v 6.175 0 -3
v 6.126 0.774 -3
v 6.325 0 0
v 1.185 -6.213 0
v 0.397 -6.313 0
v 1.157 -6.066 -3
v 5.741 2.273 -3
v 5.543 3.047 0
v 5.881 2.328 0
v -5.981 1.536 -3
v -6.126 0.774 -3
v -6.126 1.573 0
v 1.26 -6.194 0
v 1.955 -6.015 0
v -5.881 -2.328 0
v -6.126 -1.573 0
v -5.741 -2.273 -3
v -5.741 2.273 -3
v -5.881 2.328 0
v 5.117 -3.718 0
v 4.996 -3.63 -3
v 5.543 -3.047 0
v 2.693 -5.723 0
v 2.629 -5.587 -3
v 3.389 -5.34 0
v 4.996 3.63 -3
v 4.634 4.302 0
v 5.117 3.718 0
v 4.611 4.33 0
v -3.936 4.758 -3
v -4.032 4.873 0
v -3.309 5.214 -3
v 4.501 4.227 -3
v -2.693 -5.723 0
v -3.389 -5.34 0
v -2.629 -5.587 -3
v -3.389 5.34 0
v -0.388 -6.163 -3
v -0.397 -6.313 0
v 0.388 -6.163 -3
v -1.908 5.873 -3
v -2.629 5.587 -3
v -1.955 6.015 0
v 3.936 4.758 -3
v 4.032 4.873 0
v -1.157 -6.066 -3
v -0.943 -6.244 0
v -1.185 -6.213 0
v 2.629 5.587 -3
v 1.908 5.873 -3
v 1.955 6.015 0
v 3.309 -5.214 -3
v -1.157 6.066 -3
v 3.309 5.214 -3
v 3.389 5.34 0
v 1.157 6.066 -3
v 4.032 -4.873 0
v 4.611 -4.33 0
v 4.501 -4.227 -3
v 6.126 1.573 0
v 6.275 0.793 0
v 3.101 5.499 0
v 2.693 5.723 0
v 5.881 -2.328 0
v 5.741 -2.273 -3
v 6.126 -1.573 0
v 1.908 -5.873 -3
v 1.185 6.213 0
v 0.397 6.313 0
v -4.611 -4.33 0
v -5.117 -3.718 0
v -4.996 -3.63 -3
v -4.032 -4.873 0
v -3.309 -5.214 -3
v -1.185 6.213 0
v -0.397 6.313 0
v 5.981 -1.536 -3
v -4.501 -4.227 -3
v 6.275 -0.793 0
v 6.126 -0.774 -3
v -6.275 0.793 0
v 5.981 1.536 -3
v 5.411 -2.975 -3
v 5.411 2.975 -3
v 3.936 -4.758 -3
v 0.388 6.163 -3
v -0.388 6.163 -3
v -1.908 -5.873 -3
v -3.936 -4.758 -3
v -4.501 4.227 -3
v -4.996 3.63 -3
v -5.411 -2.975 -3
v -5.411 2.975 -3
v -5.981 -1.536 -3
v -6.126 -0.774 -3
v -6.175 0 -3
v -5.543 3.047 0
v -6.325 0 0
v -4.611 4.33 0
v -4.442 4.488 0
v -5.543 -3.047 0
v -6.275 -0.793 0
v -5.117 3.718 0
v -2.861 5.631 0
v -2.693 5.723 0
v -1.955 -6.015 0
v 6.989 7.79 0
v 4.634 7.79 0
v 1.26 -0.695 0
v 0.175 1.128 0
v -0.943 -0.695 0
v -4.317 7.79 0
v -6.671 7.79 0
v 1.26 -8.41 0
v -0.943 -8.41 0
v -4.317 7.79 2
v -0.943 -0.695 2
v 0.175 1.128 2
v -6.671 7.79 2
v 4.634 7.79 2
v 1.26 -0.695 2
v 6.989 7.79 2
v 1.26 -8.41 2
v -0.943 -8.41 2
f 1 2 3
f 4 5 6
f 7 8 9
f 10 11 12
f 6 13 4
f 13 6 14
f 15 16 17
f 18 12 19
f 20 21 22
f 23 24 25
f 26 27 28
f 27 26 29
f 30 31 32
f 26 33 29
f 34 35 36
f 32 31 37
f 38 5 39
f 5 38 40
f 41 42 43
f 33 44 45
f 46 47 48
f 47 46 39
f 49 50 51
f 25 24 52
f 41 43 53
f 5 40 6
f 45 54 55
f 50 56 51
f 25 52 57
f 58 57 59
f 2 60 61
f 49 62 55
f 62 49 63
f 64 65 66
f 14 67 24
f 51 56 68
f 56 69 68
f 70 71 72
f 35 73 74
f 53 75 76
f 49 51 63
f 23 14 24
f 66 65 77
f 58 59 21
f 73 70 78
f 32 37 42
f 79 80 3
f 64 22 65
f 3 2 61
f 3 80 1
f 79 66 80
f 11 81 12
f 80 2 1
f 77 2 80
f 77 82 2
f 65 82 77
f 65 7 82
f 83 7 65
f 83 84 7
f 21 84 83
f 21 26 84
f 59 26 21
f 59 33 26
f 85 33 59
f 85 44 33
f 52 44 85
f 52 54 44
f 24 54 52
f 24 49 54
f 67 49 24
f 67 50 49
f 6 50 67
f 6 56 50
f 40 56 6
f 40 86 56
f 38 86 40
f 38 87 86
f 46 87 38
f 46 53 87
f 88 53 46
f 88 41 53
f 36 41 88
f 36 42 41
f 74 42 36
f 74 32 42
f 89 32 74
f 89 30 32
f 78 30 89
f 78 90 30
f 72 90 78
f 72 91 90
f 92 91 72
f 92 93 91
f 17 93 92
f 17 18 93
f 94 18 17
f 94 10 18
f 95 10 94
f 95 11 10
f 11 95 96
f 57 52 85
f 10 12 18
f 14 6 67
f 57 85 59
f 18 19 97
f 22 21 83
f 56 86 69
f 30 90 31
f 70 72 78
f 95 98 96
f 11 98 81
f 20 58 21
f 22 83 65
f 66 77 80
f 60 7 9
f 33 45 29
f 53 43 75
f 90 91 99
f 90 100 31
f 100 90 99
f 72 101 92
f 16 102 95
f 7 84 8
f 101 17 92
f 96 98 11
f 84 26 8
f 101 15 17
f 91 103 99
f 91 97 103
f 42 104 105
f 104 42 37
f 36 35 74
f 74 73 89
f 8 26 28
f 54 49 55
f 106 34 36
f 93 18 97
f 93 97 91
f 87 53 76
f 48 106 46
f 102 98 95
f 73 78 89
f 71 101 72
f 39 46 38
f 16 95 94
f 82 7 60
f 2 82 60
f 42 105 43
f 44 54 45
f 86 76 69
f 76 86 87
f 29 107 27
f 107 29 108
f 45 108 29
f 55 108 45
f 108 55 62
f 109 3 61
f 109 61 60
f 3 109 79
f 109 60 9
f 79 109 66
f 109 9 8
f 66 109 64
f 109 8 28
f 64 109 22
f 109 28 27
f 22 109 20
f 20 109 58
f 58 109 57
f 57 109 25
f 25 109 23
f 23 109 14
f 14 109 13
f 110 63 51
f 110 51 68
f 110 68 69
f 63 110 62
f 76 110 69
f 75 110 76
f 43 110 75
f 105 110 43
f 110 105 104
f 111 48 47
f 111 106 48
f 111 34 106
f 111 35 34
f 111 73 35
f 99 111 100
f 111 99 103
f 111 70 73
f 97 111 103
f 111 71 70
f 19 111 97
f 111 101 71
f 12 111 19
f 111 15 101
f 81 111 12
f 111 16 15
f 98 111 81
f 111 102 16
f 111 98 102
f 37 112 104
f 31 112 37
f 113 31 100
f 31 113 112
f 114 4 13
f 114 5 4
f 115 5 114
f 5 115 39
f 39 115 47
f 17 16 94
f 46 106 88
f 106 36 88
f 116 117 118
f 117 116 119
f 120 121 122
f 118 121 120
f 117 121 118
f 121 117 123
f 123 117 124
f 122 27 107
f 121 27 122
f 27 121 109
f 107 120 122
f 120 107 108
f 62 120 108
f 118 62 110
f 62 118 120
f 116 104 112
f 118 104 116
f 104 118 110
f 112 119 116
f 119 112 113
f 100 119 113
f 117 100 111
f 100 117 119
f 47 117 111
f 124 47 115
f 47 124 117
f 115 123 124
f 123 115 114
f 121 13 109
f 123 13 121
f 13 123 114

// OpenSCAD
$fn = 50;

difference() {
	union() {
		translate(v = [0, 0, -3.0]) {
			cylinder(h = 3, r1 = 6.175, r2 = 6.325);
		}
		translate(v = [0, -0.5, 0]) {
			linear_extrude(height = 2) {
				text(font = "Webdings", halign = "center", size = 16, text = "Y", valign = "center");
			}
		}
	}
	union();
}
